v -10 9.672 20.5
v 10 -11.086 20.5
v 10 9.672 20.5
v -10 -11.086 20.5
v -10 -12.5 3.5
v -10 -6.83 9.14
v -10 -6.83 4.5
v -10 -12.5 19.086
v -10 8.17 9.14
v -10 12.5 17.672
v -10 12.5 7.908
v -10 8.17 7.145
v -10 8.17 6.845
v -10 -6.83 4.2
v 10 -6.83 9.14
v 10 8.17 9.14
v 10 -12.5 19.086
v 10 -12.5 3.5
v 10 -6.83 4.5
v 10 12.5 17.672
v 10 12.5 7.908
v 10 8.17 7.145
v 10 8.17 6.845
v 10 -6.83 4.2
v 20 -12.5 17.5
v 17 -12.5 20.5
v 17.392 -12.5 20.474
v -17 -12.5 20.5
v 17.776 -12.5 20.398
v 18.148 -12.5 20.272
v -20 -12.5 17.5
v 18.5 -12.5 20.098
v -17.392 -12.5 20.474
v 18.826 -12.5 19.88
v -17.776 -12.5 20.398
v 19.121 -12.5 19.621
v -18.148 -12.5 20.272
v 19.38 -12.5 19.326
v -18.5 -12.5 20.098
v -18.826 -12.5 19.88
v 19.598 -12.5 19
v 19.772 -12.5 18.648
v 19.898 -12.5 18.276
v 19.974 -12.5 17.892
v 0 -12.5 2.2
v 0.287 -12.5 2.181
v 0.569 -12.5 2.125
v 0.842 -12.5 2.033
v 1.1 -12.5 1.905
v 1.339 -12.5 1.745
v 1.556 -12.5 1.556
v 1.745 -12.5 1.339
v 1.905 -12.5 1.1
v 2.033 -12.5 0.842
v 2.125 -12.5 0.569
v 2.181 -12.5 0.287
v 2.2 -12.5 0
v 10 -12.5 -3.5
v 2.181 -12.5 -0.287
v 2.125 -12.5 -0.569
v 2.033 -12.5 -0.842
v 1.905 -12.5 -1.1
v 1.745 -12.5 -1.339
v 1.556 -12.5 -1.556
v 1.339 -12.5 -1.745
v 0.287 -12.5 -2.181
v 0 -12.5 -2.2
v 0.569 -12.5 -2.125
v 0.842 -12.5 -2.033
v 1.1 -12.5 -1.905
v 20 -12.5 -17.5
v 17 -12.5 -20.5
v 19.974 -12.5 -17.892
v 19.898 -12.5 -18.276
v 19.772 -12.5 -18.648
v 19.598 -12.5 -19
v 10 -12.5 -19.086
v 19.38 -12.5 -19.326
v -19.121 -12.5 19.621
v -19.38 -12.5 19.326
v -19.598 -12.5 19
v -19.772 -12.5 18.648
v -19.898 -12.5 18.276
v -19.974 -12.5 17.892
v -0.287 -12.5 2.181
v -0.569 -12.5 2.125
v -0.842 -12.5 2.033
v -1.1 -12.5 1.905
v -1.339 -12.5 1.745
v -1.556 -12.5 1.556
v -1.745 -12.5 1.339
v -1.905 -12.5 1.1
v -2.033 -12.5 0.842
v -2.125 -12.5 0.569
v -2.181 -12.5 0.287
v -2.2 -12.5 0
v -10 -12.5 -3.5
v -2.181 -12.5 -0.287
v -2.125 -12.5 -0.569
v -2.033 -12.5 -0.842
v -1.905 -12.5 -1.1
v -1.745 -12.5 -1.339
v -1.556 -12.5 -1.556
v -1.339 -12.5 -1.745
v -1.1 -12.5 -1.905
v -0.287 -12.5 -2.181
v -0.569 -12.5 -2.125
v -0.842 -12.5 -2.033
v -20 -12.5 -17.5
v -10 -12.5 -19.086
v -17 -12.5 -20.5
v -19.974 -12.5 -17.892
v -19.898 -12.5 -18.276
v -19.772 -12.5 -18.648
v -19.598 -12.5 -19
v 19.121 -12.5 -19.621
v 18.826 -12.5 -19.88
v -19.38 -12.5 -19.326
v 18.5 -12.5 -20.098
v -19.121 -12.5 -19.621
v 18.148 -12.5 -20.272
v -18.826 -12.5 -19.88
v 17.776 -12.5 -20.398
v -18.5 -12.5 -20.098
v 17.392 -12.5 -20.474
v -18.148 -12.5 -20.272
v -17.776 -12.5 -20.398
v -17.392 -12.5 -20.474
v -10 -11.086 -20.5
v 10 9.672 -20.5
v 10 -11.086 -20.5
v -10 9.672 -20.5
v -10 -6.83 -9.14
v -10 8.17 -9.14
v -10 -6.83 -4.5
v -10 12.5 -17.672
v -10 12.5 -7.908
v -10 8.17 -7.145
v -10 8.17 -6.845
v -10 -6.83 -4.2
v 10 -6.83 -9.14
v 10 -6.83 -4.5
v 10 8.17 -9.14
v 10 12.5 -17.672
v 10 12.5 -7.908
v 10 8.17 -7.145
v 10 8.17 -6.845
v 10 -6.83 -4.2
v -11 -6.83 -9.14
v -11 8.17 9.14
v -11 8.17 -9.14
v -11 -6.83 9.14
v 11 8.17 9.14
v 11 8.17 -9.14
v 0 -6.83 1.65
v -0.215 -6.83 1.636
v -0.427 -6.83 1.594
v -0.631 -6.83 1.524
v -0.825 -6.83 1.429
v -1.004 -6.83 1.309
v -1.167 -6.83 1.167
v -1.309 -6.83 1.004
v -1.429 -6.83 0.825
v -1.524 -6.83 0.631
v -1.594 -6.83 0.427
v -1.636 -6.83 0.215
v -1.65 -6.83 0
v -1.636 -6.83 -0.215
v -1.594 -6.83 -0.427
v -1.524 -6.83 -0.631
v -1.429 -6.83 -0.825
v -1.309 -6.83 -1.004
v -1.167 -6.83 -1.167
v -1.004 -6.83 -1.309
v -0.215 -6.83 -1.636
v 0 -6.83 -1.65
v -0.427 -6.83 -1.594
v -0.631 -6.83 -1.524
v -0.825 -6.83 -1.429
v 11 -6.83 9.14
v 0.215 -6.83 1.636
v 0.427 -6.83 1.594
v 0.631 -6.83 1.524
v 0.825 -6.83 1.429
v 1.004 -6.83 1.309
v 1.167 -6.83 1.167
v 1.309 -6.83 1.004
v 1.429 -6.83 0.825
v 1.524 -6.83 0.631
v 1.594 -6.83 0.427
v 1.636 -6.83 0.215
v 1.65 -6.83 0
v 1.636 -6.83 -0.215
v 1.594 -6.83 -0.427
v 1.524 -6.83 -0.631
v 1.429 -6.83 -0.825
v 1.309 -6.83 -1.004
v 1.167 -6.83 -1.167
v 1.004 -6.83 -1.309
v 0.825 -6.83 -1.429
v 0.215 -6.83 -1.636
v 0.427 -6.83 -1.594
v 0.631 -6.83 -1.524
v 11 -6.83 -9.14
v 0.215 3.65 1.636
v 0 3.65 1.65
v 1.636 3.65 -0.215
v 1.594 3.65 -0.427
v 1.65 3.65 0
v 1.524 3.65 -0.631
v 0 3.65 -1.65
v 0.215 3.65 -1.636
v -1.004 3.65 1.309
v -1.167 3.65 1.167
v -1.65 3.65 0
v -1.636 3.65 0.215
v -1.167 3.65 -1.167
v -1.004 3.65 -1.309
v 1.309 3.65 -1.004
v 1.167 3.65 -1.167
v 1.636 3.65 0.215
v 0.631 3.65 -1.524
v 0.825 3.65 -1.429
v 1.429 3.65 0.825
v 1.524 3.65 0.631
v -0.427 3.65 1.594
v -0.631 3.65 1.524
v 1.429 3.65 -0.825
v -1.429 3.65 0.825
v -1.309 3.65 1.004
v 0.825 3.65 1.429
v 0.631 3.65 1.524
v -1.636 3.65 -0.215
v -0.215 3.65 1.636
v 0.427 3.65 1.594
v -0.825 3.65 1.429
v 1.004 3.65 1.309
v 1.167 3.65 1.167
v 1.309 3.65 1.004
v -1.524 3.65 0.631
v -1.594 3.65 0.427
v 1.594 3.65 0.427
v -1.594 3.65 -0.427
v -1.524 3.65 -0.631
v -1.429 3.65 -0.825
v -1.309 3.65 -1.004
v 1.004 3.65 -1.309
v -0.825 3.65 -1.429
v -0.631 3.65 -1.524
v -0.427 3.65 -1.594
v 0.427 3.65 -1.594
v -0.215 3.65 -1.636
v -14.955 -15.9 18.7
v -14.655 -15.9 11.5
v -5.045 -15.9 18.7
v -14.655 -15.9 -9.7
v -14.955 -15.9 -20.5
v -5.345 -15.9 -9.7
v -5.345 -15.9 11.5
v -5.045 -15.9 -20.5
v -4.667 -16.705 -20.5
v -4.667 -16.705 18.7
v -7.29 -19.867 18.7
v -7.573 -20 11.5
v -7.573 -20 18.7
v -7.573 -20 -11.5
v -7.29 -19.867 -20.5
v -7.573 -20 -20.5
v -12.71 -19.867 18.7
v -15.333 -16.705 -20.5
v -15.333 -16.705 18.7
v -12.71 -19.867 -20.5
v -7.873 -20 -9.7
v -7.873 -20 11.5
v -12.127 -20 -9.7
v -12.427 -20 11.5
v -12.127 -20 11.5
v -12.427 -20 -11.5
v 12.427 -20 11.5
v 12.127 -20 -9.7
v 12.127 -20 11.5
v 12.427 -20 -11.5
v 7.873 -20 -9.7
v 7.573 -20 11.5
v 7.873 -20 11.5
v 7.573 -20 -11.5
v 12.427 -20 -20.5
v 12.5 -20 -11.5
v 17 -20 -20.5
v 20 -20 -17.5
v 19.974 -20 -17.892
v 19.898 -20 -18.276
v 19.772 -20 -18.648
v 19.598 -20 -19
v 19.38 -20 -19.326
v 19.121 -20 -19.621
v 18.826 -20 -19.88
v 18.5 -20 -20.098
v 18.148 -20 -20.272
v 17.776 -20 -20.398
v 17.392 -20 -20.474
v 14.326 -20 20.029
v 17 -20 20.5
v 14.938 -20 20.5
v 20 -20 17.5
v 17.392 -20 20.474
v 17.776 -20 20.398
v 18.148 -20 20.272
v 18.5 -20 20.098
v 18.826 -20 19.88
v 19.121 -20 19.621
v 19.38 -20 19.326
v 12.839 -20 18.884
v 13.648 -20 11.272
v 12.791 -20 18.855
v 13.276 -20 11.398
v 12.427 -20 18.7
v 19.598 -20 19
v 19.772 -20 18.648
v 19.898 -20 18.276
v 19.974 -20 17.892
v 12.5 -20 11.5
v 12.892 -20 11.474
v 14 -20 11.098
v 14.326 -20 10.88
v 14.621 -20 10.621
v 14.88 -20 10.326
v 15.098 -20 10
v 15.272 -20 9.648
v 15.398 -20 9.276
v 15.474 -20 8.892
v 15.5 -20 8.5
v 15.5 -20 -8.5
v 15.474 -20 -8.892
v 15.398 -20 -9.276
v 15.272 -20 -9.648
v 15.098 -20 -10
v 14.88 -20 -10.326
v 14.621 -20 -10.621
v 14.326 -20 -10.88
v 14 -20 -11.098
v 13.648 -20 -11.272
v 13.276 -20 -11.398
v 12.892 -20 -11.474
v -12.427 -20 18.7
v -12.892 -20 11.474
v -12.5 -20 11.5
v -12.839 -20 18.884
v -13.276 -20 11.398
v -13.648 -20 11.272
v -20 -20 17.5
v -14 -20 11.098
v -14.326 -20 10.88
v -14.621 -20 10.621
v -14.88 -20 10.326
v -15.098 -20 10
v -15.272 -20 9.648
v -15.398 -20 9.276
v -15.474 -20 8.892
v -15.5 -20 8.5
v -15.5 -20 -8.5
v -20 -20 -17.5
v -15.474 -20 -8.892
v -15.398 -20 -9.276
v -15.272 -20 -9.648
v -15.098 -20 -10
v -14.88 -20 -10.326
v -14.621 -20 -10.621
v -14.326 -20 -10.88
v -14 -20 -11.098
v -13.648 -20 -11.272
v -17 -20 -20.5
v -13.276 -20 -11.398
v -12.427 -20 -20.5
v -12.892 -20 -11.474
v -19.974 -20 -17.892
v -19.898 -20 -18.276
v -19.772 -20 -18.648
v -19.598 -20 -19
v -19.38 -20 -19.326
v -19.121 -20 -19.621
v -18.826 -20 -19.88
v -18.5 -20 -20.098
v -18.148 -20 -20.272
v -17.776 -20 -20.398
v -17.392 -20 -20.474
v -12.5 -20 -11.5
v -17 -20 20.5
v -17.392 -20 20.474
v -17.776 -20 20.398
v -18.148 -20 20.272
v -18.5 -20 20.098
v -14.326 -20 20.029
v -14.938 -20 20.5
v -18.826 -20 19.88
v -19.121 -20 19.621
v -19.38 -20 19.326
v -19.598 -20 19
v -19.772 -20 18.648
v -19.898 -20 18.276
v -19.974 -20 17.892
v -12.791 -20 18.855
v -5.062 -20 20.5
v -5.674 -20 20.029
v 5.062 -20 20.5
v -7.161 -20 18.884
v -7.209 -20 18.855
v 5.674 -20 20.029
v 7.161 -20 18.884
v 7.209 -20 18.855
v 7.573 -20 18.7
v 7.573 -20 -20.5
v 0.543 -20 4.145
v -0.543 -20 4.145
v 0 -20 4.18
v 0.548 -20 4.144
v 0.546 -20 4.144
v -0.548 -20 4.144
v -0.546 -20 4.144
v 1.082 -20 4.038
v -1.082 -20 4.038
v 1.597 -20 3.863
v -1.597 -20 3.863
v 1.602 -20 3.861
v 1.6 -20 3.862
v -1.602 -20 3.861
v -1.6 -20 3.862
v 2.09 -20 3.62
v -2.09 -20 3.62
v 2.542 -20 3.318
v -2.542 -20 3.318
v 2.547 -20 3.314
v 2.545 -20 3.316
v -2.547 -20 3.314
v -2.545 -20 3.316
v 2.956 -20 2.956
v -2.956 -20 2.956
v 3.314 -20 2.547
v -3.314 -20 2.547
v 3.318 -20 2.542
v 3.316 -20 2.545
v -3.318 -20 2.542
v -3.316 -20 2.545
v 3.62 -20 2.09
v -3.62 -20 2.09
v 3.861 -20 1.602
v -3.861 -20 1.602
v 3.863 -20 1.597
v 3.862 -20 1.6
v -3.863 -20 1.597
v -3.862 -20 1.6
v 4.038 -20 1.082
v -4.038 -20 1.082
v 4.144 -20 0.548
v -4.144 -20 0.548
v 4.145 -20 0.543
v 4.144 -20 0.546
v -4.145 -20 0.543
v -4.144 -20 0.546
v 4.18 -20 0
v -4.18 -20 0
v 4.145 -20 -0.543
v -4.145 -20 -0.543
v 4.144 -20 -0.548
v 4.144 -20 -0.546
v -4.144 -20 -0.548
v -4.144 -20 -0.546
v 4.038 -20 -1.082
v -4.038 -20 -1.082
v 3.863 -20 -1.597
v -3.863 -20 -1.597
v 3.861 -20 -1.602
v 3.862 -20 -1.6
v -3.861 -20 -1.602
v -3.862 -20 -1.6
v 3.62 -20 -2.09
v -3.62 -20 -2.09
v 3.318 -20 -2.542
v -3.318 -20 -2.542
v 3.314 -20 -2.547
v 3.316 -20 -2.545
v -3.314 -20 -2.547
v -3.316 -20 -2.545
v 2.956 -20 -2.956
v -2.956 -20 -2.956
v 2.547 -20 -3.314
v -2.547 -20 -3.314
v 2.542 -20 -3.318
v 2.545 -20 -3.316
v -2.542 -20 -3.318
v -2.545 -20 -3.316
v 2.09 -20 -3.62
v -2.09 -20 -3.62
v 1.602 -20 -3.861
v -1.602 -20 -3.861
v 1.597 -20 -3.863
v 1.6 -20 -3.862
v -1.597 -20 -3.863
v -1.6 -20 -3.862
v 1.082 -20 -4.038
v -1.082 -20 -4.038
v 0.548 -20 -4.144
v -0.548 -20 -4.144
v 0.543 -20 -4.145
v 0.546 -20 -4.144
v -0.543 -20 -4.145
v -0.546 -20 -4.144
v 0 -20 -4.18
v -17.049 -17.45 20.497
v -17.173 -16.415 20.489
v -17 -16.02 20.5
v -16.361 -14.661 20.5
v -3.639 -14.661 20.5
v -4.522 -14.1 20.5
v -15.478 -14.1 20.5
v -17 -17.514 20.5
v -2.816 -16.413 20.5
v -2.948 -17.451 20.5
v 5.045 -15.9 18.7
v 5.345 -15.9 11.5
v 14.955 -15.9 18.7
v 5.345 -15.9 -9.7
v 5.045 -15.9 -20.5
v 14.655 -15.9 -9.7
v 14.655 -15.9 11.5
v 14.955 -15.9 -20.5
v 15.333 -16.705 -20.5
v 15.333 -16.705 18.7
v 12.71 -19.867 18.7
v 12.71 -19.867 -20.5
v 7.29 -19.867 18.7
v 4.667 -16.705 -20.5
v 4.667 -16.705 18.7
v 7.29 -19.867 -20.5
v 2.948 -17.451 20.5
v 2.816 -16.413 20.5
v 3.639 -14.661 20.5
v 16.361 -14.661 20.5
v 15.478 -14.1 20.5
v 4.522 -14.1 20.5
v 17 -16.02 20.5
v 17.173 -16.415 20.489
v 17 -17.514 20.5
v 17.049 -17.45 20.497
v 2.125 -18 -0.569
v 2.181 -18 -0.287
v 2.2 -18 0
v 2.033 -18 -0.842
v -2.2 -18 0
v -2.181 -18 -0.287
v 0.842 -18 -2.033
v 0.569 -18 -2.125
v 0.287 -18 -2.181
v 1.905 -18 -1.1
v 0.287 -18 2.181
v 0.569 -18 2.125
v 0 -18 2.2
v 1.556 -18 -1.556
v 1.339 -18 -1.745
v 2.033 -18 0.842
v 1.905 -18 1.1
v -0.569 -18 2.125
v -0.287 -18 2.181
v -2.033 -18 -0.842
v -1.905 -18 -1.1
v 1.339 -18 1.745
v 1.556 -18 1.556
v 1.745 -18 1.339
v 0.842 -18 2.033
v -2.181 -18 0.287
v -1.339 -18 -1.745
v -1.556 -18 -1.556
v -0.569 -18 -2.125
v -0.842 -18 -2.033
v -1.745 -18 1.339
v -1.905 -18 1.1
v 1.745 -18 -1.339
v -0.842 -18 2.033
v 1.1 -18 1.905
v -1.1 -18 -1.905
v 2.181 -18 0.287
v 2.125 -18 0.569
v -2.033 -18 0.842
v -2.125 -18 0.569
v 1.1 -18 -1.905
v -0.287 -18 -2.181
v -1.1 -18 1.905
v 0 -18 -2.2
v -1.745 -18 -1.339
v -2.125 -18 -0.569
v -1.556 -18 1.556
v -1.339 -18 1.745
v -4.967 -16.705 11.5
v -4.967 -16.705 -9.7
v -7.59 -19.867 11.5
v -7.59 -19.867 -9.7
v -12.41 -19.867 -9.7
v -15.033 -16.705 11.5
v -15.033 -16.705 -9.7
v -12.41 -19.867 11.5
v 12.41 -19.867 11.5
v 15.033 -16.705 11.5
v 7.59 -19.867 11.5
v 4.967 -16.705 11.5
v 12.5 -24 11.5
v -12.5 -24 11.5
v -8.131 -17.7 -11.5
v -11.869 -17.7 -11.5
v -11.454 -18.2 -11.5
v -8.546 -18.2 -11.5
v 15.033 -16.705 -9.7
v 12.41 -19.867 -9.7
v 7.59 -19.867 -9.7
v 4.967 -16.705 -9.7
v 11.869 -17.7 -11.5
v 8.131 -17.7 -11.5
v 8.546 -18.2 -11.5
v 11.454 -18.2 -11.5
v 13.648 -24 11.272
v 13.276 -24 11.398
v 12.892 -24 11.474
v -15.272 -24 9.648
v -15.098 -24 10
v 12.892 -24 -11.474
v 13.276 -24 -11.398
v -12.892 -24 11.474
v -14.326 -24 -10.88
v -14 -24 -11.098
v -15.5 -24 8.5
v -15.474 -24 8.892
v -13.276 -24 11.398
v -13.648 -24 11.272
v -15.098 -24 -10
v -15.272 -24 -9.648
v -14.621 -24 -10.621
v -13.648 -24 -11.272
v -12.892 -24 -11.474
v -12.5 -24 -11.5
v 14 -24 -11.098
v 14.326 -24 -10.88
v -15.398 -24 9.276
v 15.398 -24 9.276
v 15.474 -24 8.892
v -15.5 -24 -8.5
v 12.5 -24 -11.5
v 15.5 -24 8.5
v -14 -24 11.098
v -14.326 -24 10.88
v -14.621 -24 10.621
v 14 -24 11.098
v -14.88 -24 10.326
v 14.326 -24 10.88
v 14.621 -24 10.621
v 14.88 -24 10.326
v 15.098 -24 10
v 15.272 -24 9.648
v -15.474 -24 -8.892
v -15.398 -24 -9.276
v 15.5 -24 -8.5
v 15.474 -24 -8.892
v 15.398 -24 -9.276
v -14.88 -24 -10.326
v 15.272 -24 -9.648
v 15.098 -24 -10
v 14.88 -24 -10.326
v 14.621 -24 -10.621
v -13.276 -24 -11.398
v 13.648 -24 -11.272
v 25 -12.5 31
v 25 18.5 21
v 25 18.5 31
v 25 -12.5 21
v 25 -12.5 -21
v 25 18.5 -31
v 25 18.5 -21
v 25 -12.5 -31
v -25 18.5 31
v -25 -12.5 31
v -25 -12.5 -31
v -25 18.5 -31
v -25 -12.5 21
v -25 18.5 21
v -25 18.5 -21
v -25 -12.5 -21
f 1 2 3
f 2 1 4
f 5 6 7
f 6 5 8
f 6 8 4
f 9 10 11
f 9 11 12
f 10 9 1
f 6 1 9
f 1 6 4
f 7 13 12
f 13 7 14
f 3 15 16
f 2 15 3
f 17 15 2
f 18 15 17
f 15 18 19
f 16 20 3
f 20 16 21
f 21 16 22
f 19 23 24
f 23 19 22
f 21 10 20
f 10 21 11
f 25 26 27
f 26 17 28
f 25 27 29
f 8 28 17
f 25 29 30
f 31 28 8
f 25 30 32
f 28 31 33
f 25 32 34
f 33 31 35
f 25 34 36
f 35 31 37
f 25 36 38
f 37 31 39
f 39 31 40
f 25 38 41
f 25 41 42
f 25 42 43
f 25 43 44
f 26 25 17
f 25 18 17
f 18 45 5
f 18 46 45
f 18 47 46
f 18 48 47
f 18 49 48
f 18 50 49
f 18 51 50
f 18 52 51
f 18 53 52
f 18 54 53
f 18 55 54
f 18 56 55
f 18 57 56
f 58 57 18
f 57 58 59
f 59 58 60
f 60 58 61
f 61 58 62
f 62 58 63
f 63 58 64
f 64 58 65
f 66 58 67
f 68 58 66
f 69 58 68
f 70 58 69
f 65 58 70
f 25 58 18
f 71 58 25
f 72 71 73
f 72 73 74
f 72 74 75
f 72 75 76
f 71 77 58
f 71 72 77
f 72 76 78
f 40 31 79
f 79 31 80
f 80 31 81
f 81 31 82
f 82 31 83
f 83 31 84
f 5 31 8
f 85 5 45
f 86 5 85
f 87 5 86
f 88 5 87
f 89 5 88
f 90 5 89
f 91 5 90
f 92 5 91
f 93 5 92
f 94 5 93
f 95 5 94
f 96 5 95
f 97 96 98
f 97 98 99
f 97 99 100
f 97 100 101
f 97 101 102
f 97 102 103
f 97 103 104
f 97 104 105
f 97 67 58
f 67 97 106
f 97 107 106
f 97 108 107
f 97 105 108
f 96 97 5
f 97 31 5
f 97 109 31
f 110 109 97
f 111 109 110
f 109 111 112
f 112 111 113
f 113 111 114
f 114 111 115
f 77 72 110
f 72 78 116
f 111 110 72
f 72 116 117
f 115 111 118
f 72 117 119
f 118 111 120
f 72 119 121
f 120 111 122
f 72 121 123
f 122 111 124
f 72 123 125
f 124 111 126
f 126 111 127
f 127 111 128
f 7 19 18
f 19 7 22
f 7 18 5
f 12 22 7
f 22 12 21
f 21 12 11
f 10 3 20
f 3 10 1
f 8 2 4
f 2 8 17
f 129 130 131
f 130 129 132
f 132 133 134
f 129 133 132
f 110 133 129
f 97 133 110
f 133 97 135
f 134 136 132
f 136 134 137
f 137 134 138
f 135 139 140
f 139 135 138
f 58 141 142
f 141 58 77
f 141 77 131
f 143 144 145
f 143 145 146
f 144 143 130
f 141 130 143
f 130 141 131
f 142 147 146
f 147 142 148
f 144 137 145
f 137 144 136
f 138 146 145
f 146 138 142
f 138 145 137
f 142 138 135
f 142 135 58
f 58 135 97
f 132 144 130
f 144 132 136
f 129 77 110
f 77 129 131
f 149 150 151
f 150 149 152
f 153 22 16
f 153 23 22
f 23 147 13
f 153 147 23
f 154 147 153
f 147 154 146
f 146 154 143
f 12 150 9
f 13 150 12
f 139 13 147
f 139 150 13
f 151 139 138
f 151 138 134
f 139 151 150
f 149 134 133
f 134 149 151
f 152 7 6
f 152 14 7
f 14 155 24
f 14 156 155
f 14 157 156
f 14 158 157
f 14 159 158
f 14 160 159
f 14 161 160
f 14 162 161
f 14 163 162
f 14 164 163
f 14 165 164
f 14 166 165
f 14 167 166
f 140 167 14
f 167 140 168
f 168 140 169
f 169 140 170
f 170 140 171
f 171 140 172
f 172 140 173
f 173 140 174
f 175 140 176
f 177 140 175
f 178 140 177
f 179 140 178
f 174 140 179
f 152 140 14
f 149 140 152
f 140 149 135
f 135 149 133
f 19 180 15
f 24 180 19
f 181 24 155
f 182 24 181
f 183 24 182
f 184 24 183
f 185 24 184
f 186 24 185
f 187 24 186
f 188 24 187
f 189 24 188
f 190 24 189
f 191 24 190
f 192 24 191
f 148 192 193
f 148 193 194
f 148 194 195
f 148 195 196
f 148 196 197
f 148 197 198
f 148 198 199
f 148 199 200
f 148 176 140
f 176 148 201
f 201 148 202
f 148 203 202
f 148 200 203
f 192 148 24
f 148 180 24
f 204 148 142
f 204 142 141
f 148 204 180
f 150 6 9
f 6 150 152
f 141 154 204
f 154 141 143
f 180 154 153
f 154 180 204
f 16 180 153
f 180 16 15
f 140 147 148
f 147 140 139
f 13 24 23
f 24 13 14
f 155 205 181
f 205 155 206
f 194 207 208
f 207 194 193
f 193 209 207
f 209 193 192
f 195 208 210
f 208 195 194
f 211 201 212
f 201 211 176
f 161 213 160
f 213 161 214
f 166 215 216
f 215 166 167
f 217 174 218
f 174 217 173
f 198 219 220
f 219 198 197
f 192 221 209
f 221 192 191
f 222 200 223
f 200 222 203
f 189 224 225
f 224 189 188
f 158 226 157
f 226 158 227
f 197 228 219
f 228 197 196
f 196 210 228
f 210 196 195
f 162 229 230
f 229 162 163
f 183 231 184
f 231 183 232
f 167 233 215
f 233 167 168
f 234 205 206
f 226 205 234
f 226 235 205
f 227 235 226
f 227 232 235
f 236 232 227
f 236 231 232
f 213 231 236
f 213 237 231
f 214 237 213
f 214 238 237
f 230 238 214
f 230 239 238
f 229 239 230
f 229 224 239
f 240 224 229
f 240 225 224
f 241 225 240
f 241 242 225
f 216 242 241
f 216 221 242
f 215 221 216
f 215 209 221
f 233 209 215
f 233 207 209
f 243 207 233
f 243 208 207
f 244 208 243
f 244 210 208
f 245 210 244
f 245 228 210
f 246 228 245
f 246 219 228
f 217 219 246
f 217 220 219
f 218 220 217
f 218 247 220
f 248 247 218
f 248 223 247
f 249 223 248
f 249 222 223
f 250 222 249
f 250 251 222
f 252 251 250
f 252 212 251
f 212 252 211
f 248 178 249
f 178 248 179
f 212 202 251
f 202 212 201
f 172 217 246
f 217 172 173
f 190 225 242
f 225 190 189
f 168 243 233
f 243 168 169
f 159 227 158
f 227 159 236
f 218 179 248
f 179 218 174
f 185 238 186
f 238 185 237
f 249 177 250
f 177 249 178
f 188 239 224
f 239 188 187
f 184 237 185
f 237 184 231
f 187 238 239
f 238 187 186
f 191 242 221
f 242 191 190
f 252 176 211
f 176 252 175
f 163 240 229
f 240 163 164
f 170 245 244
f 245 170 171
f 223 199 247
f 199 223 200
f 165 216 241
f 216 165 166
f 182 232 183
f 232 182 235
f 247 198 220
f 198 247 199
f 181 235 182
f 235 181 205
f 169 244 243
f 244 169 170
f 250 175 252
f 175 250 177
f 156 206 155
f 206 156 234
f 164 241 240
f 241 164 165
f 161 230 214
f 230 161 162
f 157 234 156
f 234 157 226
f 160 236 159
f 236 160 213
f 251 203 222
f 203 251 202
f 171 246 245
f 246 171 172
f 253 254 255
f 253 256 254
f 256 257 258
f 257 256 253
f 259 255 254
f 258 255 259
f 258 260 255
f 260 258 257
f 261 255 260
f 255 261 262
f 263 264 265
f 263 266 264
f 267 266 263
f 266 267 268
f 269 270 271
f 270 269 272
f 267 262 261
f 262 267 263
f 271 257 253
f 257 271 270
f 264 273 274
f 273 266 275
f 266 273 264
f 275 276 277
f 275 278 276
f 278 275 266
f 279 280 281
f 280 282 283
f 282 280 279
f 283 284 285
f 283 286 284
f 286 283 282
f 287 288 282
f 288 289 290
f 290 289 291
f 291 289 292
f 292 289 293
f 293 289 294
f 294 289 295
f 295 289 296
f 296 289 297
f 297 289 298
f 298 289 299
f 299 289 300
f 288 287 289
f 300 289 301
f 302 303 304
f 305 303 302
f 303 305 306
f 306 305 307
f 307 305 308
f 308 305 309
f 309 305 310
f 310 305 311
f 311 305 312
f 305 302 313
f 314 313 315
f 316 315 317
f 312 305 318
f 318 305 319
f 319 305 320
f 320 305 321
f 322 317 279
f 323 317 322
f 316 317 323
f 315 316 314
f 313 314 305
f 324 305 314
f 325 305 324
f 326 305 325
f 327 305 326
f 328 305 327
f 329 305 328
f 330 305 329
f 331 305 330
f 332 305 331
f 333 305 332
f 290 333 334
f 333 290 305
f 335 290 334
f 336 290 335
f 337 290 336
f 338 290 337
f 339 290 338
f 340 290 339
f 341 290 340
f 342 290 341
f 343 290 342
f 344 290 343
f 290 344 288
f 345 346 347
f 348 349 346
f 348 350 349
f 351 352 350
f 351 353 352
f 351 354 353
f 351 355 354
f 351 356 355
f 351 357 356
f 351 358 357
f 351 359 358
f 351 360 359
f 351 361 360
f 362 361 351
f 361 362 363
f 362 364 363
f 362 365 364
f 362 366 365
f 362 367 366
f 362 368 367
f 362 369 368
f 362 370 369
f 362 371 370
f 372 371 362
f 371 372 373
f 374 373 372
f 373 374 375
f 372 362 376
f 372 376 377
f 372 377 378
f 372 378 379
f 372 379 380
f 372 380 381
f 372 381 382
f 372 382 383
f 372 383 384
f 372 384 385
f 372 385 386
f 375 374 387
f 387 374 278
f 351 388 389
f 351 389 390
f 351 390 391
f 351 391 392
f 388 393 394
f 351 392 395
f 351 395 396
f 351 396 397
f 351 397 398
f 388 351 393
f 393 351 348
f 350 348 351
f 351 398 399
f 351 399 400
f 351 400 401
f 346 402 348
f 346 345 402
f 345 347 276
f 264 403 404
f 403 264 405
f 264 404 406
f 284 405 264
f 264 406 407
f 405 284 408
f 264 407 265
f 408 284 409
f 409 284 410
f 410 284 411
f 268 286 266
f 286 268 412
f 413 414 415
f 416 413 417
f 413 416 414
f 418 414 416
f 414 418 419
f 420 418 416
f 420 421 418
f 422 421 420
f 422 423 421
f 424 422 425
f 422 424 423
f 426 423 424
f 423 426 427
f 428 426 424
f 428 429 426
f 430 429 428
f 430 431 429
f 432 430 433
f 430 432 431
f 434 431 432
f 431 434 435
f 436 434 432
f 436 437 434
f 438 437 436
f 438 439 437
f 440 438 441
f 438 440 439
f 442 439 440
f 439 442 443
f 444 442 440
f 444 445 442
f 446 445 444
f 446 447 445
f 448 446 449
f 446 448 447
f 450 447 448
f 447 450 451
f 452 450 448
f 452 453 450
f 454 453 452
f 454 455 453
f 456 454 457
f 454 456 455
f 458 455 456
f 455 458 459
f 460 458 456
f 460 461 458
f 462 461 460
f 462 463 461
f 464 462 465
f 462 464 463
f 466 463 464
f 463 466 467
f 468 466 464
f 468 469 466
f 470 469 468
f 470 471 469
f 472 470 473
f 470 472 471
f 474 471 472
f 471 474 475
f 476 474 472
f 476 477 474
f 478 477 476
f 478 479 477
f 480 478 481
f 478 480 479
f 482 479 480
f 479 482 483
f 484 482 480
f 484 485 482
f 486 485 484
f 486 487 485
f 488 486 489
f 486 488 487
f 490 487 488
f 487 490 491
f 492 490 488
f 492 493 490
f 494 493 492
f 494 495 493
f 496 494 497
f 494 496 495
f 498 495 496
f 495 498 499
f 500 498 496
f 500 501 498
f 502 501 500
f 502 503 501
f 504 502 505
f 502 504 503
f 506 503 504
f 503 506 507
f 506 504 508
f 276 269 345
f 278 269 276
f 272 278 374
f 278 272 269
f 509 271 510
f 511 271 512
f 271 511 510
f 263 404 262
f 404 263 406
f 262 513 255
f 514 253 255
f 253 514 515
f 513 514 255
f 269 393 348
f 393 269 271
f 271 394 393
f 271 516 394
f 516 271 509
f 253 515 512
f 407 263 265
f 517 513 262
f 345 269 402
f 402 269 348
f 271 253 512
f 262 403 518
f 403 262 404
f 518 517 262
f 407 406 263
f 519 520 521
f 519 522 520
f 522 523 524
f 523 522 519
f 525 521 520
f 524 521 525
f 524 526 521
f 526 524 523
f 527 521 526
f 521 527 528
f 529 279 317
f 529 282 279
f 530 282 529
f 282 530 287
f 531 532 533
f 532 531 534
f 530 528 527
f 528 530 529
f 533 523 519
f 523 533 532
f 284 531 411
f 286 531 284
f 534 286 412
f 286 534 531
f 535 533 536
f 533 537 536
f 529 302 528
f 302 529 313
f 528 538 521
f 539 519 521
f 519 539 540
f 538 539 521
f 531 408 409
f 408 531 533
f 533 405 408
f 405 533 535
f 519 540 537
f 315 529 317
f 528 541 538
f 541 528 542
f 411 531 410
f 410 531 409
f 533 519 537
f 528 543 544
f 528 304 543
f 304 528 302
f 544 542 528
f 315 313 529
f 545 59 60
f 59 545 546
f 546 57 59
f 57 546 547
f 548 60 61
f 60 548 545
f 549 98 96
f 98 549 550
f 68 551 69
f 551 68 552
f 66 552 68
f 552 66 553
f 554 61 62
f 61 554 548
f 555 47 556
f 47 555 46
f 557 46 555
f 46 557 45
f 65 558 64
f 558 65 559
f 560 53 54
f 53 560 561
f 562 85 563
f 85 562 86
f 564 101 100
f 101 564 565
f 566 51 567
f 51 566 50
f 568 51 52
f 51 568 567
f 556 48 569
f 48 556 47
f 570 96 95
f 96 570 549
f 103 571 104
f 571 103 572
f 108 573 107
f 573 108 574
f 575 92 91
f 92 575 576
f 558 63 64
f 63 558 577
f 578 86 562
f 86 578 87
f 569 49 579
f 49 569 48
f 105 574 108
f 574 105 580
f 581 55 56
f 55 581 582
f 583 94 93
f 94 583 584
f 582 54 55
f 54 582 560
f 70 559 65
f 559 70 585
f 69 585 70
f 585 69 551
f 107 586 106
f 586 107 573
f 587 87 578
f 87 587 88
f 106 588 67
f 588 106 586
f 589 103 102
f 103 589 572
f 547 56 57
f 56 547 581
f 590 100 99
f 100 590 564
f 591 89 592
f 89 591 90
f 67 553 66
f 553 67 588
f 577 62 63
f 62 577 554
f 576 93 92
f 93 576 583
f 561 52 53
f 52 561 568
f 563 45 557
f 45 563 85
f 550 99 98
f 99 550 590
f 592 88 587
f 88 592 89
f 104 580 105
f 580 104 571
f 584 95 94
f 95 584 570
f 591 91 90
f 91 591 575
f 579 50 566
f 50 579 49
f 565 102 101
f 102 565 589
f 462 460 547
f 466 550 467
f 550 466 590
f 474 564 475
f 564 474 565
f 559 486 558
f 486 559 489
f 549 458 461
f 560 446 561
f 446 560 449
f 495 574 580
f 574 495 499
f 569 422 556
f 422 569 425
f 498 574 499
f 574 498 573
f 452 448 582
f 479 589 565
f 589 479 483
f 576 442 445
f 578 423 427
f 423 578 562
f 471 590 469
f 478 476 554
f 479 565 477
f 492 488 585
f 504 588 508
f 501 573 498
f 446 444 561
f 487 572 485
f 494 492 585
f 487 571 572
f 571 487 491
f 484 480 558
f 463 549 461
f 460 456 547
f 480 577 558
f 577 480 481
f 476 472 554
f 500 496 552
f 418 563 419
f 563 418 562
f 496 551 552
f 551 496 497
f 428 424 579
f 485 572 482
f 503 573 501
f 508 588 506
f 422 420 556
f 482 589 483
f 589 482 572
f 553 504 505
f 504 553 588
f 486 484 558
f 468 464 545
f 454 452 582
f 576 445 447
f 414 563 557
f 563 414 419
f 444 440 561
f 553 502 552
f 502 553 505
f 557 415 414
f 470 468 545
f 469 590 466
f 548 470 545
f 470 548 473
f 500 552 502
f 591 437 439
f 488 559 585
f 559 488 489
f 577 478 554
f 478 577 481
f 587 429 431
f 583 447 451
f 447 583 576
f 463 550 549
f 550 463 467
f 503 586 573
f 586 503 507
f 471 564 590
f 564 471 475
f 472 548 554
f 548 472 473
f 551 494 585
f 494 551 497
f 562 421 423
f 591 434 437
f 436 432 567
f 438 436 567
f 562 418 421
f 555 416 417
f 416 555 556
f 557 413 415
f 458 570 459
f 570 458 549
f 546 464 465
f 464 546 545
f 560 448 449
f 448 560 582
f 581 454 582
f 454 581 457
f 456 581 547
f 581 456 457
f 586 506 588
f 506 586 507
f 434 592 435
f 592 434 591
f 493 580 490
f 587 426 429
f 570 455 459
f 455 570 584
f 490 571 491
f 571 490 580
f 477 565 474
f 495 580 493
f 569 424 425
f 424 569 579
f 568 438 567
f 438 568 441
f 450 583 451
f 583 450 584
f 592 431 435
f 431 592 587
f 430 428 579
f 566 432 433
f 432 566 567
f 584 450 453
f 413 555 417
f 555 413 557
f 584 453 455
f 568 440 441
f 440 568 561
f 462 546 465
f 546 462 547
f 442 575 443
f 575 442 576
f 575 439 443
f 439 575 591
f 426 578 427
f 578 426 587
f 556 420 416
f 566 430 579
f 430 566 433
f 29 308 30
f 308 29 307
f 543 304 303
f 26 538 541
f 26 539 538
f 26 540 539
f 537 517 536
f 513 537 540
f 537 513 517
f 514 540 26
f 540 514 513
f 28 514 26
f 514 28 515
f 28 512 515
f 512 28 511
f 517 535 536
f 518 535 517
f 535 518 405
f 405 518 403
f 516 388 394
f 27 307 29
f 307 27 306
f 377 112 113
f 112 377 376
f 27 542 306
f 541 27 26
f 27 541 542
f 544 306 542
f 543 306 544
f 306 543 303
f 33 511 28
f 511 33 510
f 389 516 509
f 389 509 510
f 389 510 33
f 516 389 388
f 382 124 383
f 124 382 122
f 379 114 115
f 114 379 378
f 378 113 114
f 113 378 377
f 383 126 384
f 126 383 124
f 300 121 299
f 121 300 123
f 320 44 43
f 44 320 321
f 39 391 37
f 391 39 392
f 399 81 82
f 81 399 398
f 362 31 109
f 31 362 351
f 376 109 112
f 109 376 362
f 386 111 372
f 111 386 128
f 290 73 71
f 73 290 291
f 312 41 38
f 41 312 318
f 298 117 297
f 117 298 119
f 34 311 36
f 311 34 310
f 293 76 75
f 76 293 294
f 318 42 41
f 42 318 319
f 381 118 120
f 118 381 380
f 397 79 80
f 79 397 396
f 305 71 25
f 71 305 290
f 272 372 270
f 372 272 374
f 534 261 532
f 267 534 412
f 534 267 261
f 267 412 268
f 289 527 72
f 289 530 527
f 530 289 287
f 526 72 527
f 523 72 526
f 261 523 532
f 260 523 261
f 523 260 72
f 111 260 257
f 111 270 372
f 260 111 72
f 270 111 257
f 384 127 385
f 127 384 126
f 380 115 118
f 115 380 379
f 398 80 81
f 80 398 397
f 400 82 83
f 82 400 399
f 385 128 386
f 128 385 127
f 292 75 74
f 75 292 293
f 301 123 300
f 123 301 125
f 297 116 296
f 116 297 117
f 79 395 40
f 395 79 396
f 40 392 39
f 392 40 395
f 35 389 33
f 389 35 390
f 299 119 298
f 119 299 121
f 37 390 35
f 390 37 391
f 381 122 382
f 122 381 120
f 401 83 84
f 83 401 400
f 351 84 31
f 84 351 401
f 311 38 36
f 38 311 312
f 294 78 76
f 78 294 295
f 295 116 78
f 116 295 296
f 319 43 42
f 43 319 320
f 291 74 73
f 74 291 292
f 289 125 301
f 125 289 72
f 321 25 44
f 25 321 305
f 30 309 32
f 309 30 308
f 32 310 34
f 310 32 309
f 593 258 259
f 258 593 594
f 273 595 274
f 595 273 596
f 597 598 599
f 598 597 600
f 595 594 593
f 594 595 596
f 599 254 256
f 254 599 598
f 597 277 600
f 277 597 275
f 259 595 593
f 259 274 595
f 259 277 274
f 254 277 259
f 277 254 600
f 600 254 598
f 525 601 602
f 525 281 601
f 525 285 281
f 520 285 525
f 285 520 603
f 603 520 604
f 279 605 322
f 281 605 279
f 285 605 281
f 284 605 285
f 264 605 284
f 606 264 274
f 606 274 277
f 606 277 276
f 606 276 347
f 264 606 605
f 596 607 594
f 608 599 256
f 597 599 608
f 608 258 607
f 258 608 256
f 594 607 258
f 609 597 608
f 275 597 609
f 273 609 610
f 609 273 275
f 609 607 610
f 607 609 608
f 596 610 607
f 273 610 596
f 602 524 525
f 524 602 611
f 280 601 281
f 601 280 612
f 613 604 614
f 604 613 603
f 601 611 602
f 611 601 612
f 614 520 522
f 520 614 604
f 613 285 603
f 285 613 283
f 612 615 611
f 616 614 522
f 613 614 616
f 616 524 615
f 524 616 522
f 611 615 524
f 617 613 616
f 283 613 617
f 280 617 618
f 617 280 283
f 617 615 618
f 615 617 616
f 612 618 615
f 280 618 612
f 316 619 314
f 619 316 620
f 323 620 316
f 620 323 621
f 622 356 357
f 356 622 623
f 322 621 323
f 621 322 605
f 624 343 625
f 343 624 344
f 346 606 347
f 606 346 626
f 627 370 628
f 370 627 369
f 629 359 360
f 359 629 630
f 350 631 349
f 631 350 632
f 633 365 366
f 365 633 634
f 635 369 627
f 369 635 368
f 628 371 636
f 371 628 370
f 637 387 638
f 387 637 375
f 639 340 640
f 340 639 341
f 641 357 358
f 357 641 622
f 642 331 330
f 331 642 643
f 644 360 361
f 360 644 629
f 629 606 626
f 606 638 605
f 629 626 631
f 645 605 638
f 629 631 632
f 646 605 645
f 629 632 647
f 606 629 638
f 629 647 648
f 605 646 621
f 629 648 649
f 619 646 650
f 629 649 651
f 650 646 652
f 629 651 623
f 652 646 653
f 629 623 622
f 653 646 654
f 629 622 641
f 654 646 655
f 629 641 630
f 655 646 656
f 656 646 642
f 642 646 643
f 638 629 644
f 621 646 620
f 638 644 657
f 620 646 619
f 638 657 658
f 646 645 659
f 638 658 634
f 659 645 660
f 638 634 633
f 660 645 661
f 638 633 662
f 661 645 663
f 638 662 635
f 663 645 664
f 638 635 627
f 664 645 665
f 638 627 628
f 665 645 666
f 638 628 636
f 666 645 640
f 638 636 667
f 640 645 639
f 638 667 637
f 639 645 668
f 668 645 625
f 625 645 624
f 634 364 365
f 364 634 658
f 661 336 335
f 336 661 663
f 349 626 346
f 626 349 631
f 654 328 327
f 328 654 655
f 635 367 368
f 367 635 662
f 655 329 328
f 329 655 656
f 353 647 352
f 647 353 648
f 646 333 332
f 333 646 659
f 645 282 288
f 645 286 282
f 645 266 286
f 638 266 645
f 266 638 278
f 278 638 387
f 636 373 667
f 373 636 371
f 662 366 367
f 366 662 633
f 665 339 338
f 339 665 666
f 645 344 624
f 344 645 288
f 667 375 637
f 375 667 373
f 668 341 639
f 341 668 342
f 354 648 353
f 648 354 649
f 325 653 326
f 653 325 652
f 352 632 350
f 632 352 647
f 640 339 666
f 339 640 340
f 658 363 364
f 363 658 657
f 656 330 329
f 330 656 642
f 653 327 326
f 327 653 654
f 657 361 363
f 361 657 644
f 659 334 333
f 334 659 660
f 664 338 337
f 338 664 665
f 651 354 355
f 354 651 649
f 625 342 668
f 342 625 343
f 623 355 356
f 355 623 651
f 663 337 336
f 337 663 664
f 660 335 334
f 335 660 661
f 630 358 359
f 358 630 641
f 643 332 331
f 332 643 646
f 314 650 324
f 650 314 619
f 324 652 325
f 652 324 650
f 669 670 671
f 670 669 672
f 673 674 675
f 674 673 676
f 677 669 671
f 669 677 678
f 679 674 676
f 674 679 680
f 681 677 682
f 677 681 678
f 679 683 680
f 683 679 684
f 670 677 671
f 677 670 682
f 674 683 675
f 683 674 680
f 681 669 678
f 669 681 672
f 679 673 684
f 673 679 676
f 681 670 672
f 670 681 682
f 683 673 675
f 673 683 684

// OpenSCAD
// =============================================================================
//  expansion_jaw.scad  —  Wedge-driven 2-jaw expansion mount (slot anchor)
// =============================================================================
//  A parametric recreation + FDM enhancement of the Onshape "Expansion jaw".
//
//  WHAT IT IS
//  ----------
//  A 2-jaw spreader driven by a tapered wedge. Two mirrored jaws sit one above
//  the other with an inclined V-channel between them. A wedge rides in that V;
//  driving the wedge forward along Y (toward the operator) climbs the matched
//  10 deg faces and forces the jaws apart along Z. Collapsed, the jaw stack
//  slides into a slot; expanded, its outer faces clamp the slot's top & bottom.
//  A face plate on the front carries a vertical dovetail interface so any
//  accessory can be dropped onto the mount and is locked in X & Y by the
//  dovetail and held down by gravity.
//
//  Coordinate frame (Onshape Part Studio frame, kept here):
//      X = width  (across the jaws)
//      Y = depth  (-Y = front / room side,  +Y = back / into the slot)
//      Z = height (the expansion / spreading axis;  jaws mirror across Z=0)
//
//  See README.md in this folder for the full mechanism write-up, the mounting
//  standard, the dovetail interface spec, and assembly/print notes.
// =============================================================================

// ---- Process / machine (house defaults) -------------------------------------
nozzle_d = 0.4;
line_w   = 0.42;
layer_h  = 0.2;
material = "PETG";            // "PLA" | "PETG" -> drives the fits below
$fn      = 48;               // raise to 96+ for final export

// ---- Walls / shells ----
wall    = 6 * line_w;        // 2.52 mm, whole-perimeter multiple
floor_t = 2.4;               // >= 4 layers

// ---- Fits (per side; auto-loosened for PETG) ----
fit_slip  = (material == "PETG") ? 0.30 : 0.20;   // moving / sliding
fit_snug  = (material == "PETG") ? 0.20 : 0.10;   // locating
fit_press = (material == "PETG") ? 0.05 : 0.00;   // interference
insert_d  = (material == "PETG") ? 4.2  : 4.0;    // M3 heat-set bore

// =============================================================================
//  RENDER SELECTION
// =============================================================================
part    = "assembly";   // "assembly" | "jaws" | "top_jaw" | "bottom_jaw"
                        // | "wedge" | "face_plate" | "accessory" | "interface_test"
explode = 0;            // mm: pull parts apart along their assembly axes for clarity
show_slot = true;       // draw a translucent mock slot in the assembly view

// =============================================================================
//  MECHANISM PARAMETERS  (named exactly as the Onshape model where possible)
// =============================================================================
Jaws_width  = 20;   // jaw extent along X
Jaws_depth  = 25;   // jaw extent along Y (= how deep the jaws sit in the slot)
Jaws_height = 41;   // collapsed stacked height of the jaw block along Z
Angle_jaws  = 80;   // [deg] inclined channel/wedge face angle vs. the base
incline     = 90 - Angle_jaws;          // = 10 deg half-V incline from the Y axis
wedge_depth = 15;   // wedge extent along Y

// ---- Slot the mount grips (bathroom ledge reveal). Fully parametric. --------
// Collapsed jaws must insert (outer height < slot_gap); the wedge then expands
// them to bite. Default leaves the original 41 mm envelope; set to your slot.
slot_gap    = Jaws_height + 1.0;   // vertical opening of the slot (Z)
slot_depth  = Jaws_depth + 6;      // how deep the slot runs (Y), for the mock

// ---- Derived jaw channel geometry -------------------------------------------
half_h    = Jaws_height / 2;                       // 20.5  outer face |Z|
gap_front = 3.5;                                   // inner half-gap at front (-Y)
gap_back  = gap_front + tan(incline) * Jaws_depth; // ~7.91 inner half-gap at back

// ---- Wedge geometry ---------------------------------------------------------
// Same 10 deg faces as the channel; thick at the back so drawing it forward
// (toward the face plate) feeds the thick section into the jaw zone -> spread.
wedge_front_h = 4.5;                                       // half-height, front
wedge_back_h  = wedge_front_h + tan(incline) * wedge_depth; // ~7.14, back
wedge_y0      = -6.83;                                     // front face Y
wedge_y1      = wedge_y0 + wedge_depth;                    // back face Y (~8.17)
wedge_tab     = 1.0;                                       // end retainer tab thickness
wedge_tab_h   = 9.14;                                      // tab half-height (end stop)

// ---- Visual language --------------------------------------------------------
edge   = 3.0;     // rounded vertical-edge radius on the face plate / accessory
rim_ch = 1.0;     // chamfer on mouths / lead-in edges
cham   = 2.0;     // main outer chamfer (Onshape "Chamfer 1")

// ---- Grip teeth on the clamping faces ---------------------------------------
// A clean inset field of directional sawteeth (steep face toward the front so
// they BITE when the mount is pulled out of the slot, ramp gently on insertion).
// The field is inset from every edge so it never collides with the chamfers.
grip_teeth   = false;        // OFF by default: on a hard slot (tile/stone/metal)
                            //   a FLAT face grips better (see README). Turn on
                            //   only for a soft slot (wood/plaster/plastic).
tooth_h      = 0.5;          // ridge height
tooth_pitch  = 1.6;          // fine, refined texture
tooth_margin = 3.0;          // inset from the side & front edges

// ---- Drive screw (a SINGLE M4 that closes the whole clamp force loop) --------
// Head countersunk in the face-plate front -> shaft through the centre gap
// between the jaws -> threads into the wedge. Tightening draws the wedge forward
// (spreads the jaws) AND sandwiches the face plate against the jaw fronts, so no
// separate anchor screws are needed: ONE fastener does everything.
drive_clear = 4.4;          // M4 free-clearance shaft
drive_pilot = 3.3;          // M4 self-tap pilot into the wedge (set-and-forget)
screw_head  = "flat";       // "flat" = 90-deg countersunk (flush) | "socket" = counter-bore
csk_d       = 8.4;          // flat-head 90-deg countersink rim dia (M4 head ~7.5-8)
head_d      = 7.4;          // socket-head dia + clearance (counter-bore option)
head_h      = 4.0;          // socket counter-bore depth

// =============================================================================
//  DOVETAIL MOUNTING INTERFACE  (the reusable standard — see README)
// =============================================================================
//  Two vertical dovetail slots in the face plate; accessories carry the two
//  matching male tenons and drop in from the top (locked in X & Y, held by
//  gravity). Keep these in sync between the mount and every accessory file.
dt_pitch = 20;     // centre-to-centre spacing of the two tails (=> X = +-10)
dt_mouth = 5.2;    // narrow (front/mouth) width of the dovetail
dt_base  = 12.0;   // wide (deep) width of the dovetail
dt_depth = 4.1;    // depth of the dovetail into the plate (along +Y)
dt_run_z = Jaws_height;   // the slots run the full plate height (Z)
dt_cham  = 0.7;    // 45-deg CHAMFER on every corner -> relieves the slot roots
                  //   and breaks the tenon tips, while the locking FLANKS stay
                  //   dead straight for full-face contact (no soft/round look)
dt_lead  = 1.8;    // 45-deg lead-in: funnel on the slot top + point on the tenon
                  //   bottom, so the accessory self-aligns as it drops in

// 2D dovetail in the (X,Y) cut plane: mouth at y=0 widening to +Y. Corners are
// chamfered (not rounded): on the female cut the chamfer relieves the root
// corners (printable, nozzle reaches them); on the male tenon it breaks the
// sharp tips. The straight flanks are untouched, so the joint still locks
// solidly. The same profile drives BOTH halves -> they can't drift apart.
module dovetail_profile_2d(clr = 0) {
    offset(delta = dt_cham, chamfer = true) offset(delta = -dt_cham, chamfer = true)
        polygon([
            [-dt_mouth/2 - clr, 0],
            [ dt_mouth/2 + clr, 0],
            [ dt_base/2  + clr, dt_depth],
            [-dt_base/2  - clr, dt_depth],
        ]);
}

// Female slot, swept `h` along Z (the slide axis) and centred, with a flared
// funnel mouth at the TOP (+Z) so a dropped-in tenon is captured even if a
// little off. Printed Z-up this is a constant-section extrusion = no overhang.
module dovetail_slot(h, clr = 0) {
    union() {
        linear_extrude(height = h + 2*eps, center = true) dovetail_profile_2d(clr);
        translate([0, 0, h/2 - dt_lead])               // flare the top entry
            hull() {
                linear_extrude(eps) dovetail_profile_2d(clr);
                translate([0, 0, dt_lead])
                    linear_extrude(eps) offset(delta = dt_lead, chamfer = true) dovetail_profile_2d(clr);
            }
    }
}

// Male tenon, swept `h` along Z and centred, with a 45-deg lead-in point at the
// BOTTOM (-Z, the end that enters the slot first). `clr` is negative for slip.
module dovetail_tenon(h, clr = -fit_slip) {
    translate([0, 0, -h/2])
        union() {
            translate([0, 0, dt_lead])
                linear_extrude(height = h - dt_lead) dovetail_profile_2d(clr);
            hull() {                                   // taper the entering tip
                translate([0, 0, dt_lead])
                    linear_extrude(eps) dovetail_profile_2d(clr);
                linear_extrude(eps) offset(delta = -dt_lead, chamfer = true) dovetail_profile_2d(clr);
            }
        }
}

// =============================================================================
//  LOW-LEVEL HELPERS
// =============================================================================
eps = 0.02;

// Sweep a 2D (Y,Z) polygon `len` mm along +X. Maps polygon-x -> Y, polygon-y -> Z.
module prismX(len) {
    multmatrix([[0,0,1,0],
                [1,0,0,0],
                [0,1,0,0],
                [0,0,0,1]])
        linear_extrude(height = len) children();
}

// Rounded rectangle (vertical-edge rounding) in 2D.
module rrect(w, h, r) {
    offset(r) offset(-r) square([w, h], center = true);
}

// =============================================================================
//  JAWS
// =============================================================================
// Cross-section of the TOP jaw in the (Y,Z) plane, swept along X and centred:
//   outer (top) face flat at Z = half_h
//   inner (bottom) face inclined: gap_front at -Y up to gap_back at +Y
module top_jaw_profile() {
    polygon([
        [-Jaws_depth/2, gap_front],   // front-inner
        [ Jaws_depth/2, gap_back ],   // back-inner
        [ Jaws_depth/2, half_h  ],    // back-outer
        [-Jaws_depth/2, half_h  ],    // front-outer
    ]);
}

// Clean directional grip pad on a clamping face. `face_z` = the outer face Z,
// `dir` = +1 (top jaw) / -1 (bottom jaw). The sawtooth field is generated, then
// intersected with an inset footprint so it stays clear of every edge & chamfer.
module grip_pad(face_z, dir) {
    y0   = -Jaws_depth/2 + tooth_margin;             // clear of the front edge
    y1   =  Jaws_depth/2 - cham - tooth_margin;      // clear of the back chamfer
    x_in =  Jaws_width/2 - tooth_margin;             // clear of both side edges
    n    =  floor((y1 - y0) / tooth_pitch);
    intersection() {
        union()                                       // directional sawteeth
            for (i = [0 : n - 1]) {
                yt = y0 + i * tooth_pitch;
                translate([-x_in, yt, face_z])
                    prismX(2 * x_in)
                        // steep (biting) face toward -Y, ramp toward +Y
                        polygon([[0, 0], [0, dir*tooth_h], [tooth_pitch, 0]]);
            }
        translate([-x_in, y0, face_z - (tooth_h + 1)])  // clip to inset footprint
            cube([2*x_in, y1 - y0, 2*(tooth_h + 1)]);
    }
}

// One consistent lead-in chamfer on an outer top edge of the jaw. `ys` = +1 for
// the back (insertion) edge, -1 for the front edge; `c` = chamfer size.
module jaw_edge_chamfer(ys, c) {
    translate([0, ys * Jaws_depth/2, half_h])
        rotate([45, 0, 0])
            translate([-Jaws_width/2 - eps, -c, -c])
                cube([Jaws_width + 2*eps, 2*c, 2*c]);
}

module top_jaw() {
    union() {
        difference() {
            translate([-Jaws_width/2, 0, 0])
                prismX(Jaws_width) top_jaw_profile();
            jaw_edge_chamfer(+1, cham);     // back/insertion lead-in (bigger)
            jaw_edge_chamfer(-1, rim_ch);   // front edge, consistent soft break
        }
        if (grip_teeth) grip_pad(half_h, +1);
    }
}

module bottom_jaw() { mirror([0, 0, 1]) top_jaw(); }

// =============================================================================
//  WEDGE
// =============================================================================
// Trapezoidal prism: half-height grows from wedge_front_h to wedge_back_h over
// wedge_depth (matched 10 deg faces). End tabs cap each side as retainers so the
// wedge cannot slide out along X.
// `clr` shrinks the wedge off the inclined faces so it can actually slide in
// the channel (nominal faces are exactly coincident with the jaws).
module wedge_core_profile(clr = 0) {
    polygon([
        [wedge_y0, -(wedge_front_h - clr)],
        [wedge_y1, -(wedge_back_h  - clr)],
        [wedge_y1,   wedge_back_h  - clr ],
        [wedge_y0,   wedge_front_h - clr ],
    ]);
}

module wedge() {
    difference() {
        union() {
            // core, centred across X (slip-fit off the inclined faces)
            translate([-Jaws_width/2, 0, 0])
                prismX(Jaws_width) wedge_core_profile(fit_slip);
            // retainer tabs on each X end, a touch taller than the core
            for (sx = [-1, 1])
                translate([sx * (Jaws_width/2), 0, 0]) {
                    if (sx < 0) translate([-wedge_tab, 0, 0]) wedge_tab();
                    else                                      wedge_tab();
                }
        }
        // drive-screw pocket in the FRONT face (pilot or heat-set insert bore)
        translate([0, wedge_y0 - eps, 0])
            rotate([-90, 0, 0])
                cylinder(d = drive_pilot, h = wedge_depth * 0.7);
    }
}

module wedge_tab() {
    translate([0, 0, 0])
        prismX(wedge_tab)
            polygon([
                [wedge_y0, -wedge_tab_h],
                [wedge_y1, -wedge_tab_h],
                [wedge_y1,  wedge_tab_h],
                [wedge_y0,  wedge_tab_h],
            ]);
}

// =============================================================================
//  FACE PLATE  (mount-side: carries the female dovetail interface)
// =============================================================================
fp_w  = 40;                       // X
fp_h  = Jaws_height;              // Z (= 41)
fp_t  = 7.5;                      // Y thickness
fp_y0 = -Jaws_depth/2 - fp_t;     // front face Y (sits against the jaw fronts)
fp_y1 = -Jaws_depth/2;            // back face Y

module face_plate() {
    difference() {
        // plate with rounded vertical edges, extruded along Y
        translate([0, fp_y0, 0])
            rotate([-90, 0, 0])
                linear_extrude(height = fp_t)
                    rrect(fp_w, fp_h, edge);
        // --- two female dovetail slots: run the FULL height along Z, mouth at
        //     the front face widening into +Y, open top & bottom so an accessory
        //     can be dropped in from the top and is locked in X & Y ---
        for (sx = [-1, 1])
            translate([sx * dt_pitch/2, fp_y0, 0])
                dovetail_slot(fp_h, 0);
        // --- single drive screw: countersunk head in the front, shaft through
        //     to the wedge (the head seat is the only fastener feature) ---
        drive_screw_cut();
    }
}

// The drive-screw cut, opening at the face-plate FRONT (-Y) along +Y at Z=0.
module drive_screw_cut() {
    translate([0, fp_y0 - eps, 0])
        rotate([-90, 0, 0]) {
            cylinder(d = drive_clear, h = fp_t + 2*eps);          // shaft
            if (screw_head == "flat")                              // 90-deg countersink
                cylinder(d1 = csk_d, d2 = drive_clear, h = (csk_d - drive_clear)/2 + eps);
            else {                                                 // socket counter-bore
                cylinder(d = head_d, h = head_h);
                cylinder(d1 = csk_d, d2 = head_d, h = (csk_d - head_d)/2 + eps);  // mouth chamfer
            }
        }
}

// =============================================================================
//  ACCESSORY BASE  (accessory-side: carries the male dovetail tenons)
// =============================================================================
// This is the module future accessory files reuse: build your object, then add
// accessory_base() on its back so it keys onto the mount's face plate.
acc_w  = 31;                  // block X
acc_h  = 23;                  // block Z
acc_t  = 4;                   // backing-plate thickness (Y) behind the tenons
acc_y1 = fp_y0;               // tenon tips meet the plate front
acc_y0 = acc_y1 - acc_t;      // back of the accessory backing plate

module accessory_base() {
    // backing plate
    translate([0, acc_y0, 0])
        rotate([-90, 0, 0])
            linear_extrude(height = acc_t)
                rrect(acc_w, acc_h, edge);
    // two male tenons reaching into the face-plate slots (slip fit, run the
    // accessory's full height along Z, lead-in point at the bottom for drop-in)
    for (sx = [-1, 1])
        translate([sx * dt_pitch/2, fp_y0, 0])
            dovetail_tenon(acc_h, -fit_slip);
}

// =============================================================================
//  MOCK SLOT  (visual aid only)
// =============================================================================
module mock_slot() {
    color([0.6, 0.7, 0.8, 0.25])
        difference() {
            translate([-fp_w/2 - 5, -Jaws_depth/2, -slot_gap/2 - 10])
                cube([fp_w + 10, slot_depth, slot_gap + 20]);
            translate([-fp_w/2 - 5 - eps, -Jaws_depth/2 - eps, -slot_gap/2])
                cube([fp_w + 10 + 2*eps, slot_depth + 2*eps, slot_gap]);
        }
}

// =============================================================================
//  ASSEMBLY
// =============================================================================
module assembly() {
    e = explode;
    color("LightSteelBlue") translate([0, 0,  e]) top_jaw();
    color("LightSteelBlue") translate([0, 0, -e]) bottom_jaw();
    color("Khaki")          translate([0, -e, 0]) wedge();
    color("Gainsboro")      translate([0, -2*e, 0]) face_plate();
    color("DarkSeaGreen")   translate([0, -4*e, 0]) accessory_base();
    if (show_slot) mock_slot();
}

// =============================================================================
//  DISPATCH
// =============================================================================
if      (part == "assembly")    assembly();
else if (part == "jaws")        { top_jaw(); bottom_jaw(); }
else if (part == "top_jaw")     top_jaw();
else if (part == "bottom_jaw")  bottom_jaw();
else if (part == "wedge")       wedge();
else if (part == "face_plate")  face_plate();
else if (part == "accessory")   accessory_base();
else if (part == "interface_test") { face_plate(); accessory_base(); }
else assembly();
